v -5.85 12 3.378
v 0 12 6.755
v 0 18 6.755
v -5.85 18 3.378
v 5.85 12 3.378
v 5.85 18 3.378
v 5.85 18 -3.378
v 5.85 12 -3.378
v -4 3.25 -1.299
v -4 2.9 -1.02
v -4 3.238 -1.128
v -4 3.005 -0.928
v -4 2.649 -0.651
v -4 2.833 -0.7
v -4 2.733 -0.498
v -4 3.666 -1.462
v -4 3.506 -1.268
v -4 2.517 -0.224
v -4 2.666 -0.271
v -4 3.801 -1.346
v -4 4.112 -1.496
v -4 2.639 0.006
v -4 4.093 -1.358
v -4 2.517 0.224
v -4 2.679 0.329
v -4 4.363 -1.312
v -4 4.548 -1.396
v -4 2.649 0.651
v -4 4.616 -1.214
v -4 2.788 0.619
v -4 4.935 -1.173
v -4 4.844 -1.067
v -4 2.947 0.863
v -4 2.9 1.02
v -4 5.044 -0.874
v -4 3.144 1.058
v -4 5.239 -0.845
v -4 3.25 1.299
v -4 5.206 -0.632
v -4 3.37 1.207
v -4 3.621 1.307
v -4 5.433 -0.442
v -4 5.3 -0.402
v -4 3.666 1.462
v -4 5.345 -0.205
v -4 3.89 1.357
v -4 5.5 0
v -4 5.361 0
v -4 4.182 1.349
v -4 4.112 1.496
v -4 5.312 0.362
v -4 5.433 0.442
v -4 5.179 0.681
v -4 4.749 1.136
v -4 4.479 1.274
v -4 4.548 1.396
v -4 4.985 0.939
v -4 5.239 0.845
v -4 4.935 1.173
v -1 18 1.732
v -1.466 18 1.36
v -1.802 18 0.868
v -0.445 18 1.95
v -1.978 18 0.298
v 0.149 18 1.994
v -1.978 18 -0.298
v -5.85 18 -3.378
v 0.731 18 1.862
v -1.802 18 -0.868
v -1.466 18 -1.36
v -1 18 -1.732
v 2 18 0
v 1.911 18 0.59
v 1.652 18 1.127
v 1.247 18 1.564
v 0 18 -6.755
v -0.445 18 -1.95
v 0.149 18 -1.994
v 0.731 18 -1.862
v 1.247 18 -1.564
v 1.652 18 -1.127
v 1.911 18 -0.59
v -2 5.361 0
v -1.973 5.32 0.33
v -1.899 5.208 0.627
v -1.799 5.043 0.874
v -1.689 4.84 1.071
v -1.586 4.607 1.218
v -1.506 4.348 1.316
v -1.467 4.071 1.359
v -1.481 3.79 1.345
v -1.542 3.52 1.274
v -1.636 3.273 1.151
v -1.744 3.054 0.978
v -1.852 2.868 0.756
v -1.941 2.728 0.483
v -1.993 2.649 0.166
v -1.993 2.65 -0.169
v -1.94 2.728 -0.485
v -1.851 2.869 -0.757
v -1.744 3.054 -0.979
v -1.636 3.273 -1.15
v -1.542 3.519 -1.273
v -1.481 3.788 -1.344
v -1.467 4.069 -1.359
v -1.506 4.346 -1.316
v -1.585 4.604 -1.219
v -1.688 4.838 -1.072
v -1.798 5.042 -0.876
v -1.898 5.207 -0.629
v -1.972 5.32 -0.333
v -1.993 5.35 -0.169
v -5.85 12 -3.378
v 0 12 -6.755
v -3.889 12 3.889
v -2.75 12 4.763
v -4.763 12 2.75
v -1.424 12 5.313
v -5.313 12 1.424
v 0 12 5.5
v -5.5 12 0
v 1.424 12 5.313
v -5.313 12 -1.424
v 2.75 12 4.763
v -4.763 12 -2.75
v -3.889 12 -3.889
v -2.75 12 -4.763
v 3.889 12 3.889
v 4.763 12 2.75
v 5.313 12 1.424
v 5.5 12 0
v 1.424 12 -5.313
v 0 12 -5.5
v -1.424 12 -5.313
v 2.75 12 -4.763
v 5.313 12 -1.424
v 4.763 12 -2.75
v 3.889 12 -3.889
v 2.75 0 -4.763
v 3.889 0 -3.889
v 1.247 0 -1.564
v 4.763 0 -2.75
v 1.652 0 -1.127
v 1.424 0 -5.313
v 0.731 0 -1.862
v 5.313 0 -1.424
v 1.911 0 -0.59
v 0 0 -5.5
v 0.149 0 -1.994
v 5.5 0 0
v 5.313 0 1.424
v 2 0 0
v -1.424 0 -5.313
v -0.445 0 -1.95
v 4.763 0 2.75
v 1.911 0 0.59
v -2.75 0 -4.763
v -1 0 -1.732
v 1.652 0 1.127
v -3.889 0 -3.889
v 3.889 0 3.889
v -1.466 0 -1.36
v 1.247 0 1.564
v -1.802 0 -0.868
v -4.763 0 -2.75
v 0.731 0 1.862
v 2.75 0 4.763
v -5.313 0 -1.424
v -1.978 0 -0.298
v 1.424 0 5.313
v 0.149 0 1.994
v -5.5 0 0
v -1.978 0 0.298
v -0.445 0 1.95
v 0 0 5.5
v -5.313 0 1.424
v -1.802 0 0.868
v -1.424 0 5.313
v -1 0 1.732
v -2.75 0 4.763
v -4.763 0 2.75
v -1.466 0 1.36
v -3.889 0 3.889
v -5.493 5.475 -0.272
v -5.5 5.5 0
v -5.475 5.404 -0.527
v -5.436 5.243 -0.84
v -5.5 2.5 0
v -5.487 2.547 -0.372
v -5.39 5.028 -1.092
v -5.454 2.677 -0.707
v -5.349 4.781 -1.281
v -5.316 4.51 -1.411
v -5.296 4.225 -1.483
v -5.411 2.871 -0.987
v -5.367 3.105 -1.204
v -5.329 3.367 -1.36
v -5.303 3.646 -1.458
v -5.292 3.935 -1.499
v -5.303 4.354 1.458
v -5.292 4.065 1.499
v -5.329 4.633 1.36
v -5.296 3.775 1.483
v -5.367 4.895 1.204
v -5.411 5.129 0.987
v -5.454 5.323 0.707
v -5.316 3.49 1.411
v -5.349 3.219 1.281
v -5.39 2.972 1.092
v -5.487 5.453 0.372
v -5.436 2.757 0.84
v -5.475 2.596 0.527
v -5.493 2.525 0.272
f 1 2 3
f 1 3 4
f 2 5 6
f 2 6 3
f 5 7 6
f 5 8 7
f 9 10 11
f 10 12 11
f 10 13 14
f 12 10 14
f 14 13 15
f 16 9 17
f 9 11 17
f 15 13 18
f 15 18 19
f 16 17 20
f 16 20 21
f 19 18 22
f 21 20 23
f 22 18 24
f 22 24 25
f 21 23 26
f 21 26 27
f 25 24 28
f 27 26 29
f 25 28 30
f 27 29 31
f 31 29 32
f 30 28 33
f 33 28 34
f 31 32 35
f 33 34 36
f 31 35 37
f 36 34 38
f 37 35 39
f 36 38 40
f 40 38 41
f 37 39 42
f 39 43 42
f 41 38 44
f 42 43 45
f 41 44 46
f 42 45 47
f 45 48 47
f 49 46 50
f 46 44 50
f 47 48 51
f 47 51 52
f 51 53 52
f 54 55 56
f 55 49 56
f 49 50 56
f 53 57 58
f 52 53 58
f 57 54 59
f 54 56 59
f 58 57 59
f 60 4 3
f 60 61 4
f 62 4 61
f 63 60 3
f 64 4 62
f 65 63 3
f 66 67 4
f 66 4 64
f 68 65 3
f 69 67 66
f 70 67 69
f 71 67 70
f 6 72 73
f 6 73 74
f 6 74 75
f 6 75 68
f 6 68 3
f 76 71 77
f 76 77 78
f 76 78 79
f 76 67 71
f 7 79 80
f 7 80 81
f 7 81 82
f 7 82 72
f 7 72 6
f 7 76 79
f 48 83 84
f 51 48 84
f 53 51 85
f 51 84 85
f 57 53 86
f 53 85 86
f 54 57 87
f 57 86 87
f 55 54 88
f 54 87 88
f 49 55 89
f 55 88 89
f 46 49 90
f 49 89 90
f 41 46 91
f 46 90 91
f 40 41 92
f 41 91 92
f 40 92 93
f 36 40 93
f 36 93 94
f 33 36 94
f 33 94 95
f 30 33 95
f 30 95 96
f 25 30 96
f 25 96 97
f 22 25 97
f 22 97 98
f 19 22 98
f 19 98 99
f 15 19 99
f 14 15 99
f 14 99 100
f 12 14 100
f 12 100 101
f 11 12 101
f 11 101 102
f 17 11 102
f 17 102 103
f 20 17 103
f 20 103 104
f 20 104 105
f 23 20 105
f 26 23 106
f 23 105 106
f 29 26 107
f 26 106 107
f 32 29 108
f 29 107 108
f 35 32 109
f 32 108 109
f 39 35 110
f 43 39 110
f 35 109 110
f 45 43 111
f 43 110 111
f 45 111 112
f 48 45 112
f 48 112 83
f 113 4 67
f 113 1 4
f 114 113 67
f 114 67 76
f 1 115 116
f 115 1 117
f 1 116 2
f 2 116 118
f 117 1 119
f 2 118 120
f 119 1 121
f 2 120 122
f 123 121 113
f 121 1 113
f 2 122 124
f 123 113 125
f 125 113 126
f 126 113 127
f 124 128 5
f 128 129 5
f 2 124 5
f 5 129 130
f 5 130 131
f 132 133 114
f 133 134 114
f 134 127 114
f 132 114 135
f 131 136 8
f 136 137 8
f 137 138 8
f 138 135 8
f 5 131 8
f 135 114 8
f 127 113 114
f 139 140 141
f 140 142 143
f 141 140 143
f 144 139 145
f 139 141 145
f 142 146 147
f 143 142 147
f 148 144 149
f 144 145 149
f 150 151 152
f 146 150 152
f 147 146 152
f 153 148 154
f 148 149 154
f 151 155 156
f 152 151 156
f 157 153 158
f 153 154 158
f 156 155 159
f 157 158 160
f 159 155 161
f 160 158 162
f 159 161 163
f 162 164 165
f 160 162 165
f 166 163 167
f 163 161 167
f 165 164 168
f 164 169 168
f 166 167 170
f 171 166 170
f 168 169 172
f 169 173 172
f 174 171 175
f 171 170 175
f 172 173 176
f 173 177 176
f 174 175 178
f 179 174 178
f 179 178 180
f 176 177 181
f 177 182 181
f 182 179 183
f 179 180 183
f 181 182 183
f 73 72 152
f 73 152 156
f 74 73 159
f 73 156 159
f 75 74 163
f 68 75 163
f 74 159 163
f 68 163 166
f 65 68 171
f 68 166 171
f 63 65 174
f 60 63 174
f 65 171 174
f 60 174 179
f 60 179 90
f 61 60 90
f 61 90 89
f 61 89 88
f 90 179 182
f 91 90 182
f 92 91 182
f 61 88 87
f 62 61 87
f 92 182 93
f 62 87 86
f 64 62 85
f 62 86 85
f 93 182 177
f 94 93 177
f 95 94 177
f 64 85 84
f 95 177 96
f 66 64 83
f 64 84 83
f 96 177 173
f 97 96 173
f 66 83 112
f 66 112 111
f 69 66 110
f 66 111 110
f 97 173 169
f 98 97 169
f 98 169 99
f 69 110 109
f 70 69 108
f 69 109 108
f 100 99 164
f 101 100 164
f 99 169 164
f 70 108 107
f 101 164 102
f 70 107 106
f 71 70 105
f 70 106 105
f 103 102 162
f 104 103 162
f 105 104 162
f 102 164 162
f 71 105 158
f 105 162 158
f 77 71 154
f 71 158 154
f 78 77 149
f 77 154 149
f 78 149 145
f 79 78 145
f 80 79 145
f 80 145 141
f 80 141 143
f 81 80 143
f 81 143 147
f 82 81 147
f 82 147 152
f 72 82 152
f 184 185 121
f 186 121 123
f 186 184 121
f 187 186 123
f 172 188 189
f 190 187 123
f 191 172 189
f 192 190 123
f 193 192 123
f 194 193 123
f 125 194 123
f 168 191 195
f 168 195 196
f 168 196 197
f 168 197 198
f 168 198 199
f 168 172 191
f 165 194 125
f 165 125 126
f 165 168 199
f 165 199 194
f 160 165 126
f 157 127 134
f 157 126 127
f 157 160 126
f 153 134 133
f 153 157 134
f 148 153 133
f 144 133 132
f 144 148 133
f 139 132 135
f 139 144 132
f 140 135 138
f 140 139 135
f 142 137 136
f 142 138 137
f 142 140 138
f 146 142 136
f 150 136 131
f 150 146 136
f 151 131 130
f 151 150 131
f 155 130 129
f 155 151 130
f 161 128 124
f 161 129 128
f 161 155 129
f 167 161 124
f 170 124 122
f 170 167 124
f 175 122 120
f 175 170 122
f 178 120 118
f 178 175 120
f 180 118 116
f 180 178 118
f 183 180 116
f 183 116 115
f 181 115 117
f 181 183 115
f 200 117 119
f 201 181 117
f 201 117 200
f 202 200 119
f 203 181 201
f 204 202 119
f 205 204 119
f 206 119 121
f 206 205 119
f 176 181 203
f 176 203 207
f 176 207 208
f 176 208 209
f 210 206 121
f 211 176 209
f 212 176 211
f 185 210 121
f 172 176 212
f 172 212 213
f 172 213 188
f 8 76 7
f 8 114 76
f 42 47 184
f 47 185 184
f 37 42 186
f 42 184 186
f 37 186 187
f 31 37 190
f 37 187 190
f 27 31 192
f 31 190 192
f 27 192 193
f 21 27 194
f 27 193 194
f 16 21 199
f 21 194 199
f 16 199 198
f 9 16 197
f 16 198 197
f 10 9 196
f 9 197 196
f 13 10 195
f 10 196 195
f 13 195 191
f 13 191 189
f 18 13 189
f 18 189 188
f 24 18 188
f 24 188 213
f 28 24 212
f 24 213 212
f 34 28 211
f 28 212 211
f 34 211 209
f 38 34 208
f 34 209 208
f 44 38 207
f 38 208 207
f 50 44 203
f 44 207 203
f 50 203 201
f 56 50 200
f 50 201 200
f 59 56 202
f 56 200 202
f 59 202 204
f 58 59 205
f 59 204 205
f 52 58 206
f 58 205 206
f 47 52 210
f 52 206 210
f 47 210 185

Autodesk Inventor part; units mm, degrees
ref_plane "XZ Plane" through (0, 0, 0) normal (0, 1, 0) x (-1, 0, 0)
ref_plane "XY Plane" through (0, 0, 0) normal (0, 0, 1) x (1, 0, 0)
sketch "草圖1" plane through (0, 0, 0) normal (0, 1, 0) x (-1, 0, 0)
  circle A0 centre (0, 0) radius 5.5
  dimension "d0" = 11
extrude "擠出1" add sketch "草圖1" along normal blind 12
sketch "草圖2" plane through (0, 12, 0) normal (0, 1, 0) x (1, 0, 0)
  line L0 (5.85, -3.3775) -> (0, -6.755)
  line L1 (0, -6.755) -> (-5.85, -3.3775)
  line L2 (-5.85, -3.3775) -> (-5.85, 3.3775)
  line L3 (-5.85, 3.3775) -> (0, 6.755)
  line L4 (0, 6.755) -> (5.85, 3.3775)
  line L5 (5.85, 3.3775) -> (5.85, -3.3775)
  point P0 (0, 0)
  point P1 (0, 0)
  dimension "d3" = 11.7
extrude "擠出2" add sketch "草圖2" along normal blind 6
sketch "草圖3" plane through (0, 0, 0) normal (0, -1, 0) x (1, 0, 0)
  circle A0 centre (0, 0) radius 2
  dimension "d6" = 4
extrude "擠出3" cut sketch "草圖3" against normal up to surface (18 mm away)
sketch "草圖5" plane through (0, 0, 0) normal (1, 0, 0) x (0, 1, 0)
  circle A0 centre (4, 0) radius 1.361
  point P0 (0, 0)
  dimension "d12" = 4
extrude "擠出5" cut sketch "草圖5" against normal through all
sketch "草圖6" plane through (0, 0, 0) normal (0, -1, 0) x (1, 0, 0)
  circle A0 centre (0, 0) radius 2 projected
  circle A1 centre (0, 0) radius 5.5 projected
  circle A2 centre (0, 0) radius 2 projected
  line L0 (1.0536, 1.7) -> (-1.0536, 1.7)
  dimension "d15" = 1.7
ref_plane "工作平面2" through (-5.5, 0, 0) normal (1, 0, 0) x (0, 1, 0)
ref_plane "工作平面1" through (5.5, 0, 0) normal (1, 0, 0) x (0, 1, 0)
sketch "草圖7" plane through (-5.5, 0, 0) normal (1, 0, 0) x (0, 1, 0)
  spline S0 degree 5 poles (5.361, 0) (5.361, 0.1236) (5.347, 0.2463) (5.3194, 0.3649) (5.2798, 0.4768) (5.1704, 0.7094) (5.0945, 0.8261) (5.0077, 0.929) (4.9122, 1.0182) (4.67, 1.1972) (4.517, 1.2762) (4.3518, 1.3325) (4.1759, 1.361) (3.8245, 1.361) (3.6486, 1.3326) (3.4837, 1.2765) (3.3306, 1.1975) (3.1182, 1.0408) (3.0486, 0.98) (2.9834, 0.9125) (2.9233, 0.8382) (2.7861, 0.6333) (2.7171, 0.4936) (2.6652, 0.3374) (2.639, 0.1686) (2.639, -0.1236) (2.653, -0.2463) (2.6806, -0.3649) (2.7202, -0.4768) (2.8296, -0.7094) (2.9055, -0.8261) (2.9923, -0.929) (3.0878, -1.0182) (3.33, -1.1972) (3.483, -1.2762) (3.6482, -1.3325) (3.8241, -1.361) (4.1755, -1.361) (4.3514, -1.3326) (4.5163, -1.2765) (4.6694, -1.1975) (4.9141, -1.0169) (5.0116, -0.9254) (5.1001, -0.8195) (5.177, -0.6991) (5.2842, -0.4643) (5.3217, -0.355) (5.3478, -0.2394) (5.361, -0.1201) (5.361, 0) knots 0 0 0 0 0 0 0.063036 0.063036 0.063036 0.063036 0.142762 0.142762 0.142762 0.142762 0.249982 0.249982 0.249982 0.249982 0.35698 0.35698 0.35698 0.35698 0.413527 0.413527 0.413527 0.413527 0.499667 0.499667 0.499667 0.499667 0.562796 0.562796 0.562796 0.562796 0.64264 0.64264 0.64264 0.64264 0.750018 0.750018 0.750018 0.750018 0.857175 0.857175 0.857175 0.857175 0.93874 0.93874 0.93874 0.93874 1 1 1 1 1 1 projected
  circle A0 centre (4, 0) radius 1.5
  point P0 (0, 0)
  dimension "d17" = 3
extrude "擠出6" cut sketch "草圖7" along normal blind 1.5
properties part number "Coupling"
